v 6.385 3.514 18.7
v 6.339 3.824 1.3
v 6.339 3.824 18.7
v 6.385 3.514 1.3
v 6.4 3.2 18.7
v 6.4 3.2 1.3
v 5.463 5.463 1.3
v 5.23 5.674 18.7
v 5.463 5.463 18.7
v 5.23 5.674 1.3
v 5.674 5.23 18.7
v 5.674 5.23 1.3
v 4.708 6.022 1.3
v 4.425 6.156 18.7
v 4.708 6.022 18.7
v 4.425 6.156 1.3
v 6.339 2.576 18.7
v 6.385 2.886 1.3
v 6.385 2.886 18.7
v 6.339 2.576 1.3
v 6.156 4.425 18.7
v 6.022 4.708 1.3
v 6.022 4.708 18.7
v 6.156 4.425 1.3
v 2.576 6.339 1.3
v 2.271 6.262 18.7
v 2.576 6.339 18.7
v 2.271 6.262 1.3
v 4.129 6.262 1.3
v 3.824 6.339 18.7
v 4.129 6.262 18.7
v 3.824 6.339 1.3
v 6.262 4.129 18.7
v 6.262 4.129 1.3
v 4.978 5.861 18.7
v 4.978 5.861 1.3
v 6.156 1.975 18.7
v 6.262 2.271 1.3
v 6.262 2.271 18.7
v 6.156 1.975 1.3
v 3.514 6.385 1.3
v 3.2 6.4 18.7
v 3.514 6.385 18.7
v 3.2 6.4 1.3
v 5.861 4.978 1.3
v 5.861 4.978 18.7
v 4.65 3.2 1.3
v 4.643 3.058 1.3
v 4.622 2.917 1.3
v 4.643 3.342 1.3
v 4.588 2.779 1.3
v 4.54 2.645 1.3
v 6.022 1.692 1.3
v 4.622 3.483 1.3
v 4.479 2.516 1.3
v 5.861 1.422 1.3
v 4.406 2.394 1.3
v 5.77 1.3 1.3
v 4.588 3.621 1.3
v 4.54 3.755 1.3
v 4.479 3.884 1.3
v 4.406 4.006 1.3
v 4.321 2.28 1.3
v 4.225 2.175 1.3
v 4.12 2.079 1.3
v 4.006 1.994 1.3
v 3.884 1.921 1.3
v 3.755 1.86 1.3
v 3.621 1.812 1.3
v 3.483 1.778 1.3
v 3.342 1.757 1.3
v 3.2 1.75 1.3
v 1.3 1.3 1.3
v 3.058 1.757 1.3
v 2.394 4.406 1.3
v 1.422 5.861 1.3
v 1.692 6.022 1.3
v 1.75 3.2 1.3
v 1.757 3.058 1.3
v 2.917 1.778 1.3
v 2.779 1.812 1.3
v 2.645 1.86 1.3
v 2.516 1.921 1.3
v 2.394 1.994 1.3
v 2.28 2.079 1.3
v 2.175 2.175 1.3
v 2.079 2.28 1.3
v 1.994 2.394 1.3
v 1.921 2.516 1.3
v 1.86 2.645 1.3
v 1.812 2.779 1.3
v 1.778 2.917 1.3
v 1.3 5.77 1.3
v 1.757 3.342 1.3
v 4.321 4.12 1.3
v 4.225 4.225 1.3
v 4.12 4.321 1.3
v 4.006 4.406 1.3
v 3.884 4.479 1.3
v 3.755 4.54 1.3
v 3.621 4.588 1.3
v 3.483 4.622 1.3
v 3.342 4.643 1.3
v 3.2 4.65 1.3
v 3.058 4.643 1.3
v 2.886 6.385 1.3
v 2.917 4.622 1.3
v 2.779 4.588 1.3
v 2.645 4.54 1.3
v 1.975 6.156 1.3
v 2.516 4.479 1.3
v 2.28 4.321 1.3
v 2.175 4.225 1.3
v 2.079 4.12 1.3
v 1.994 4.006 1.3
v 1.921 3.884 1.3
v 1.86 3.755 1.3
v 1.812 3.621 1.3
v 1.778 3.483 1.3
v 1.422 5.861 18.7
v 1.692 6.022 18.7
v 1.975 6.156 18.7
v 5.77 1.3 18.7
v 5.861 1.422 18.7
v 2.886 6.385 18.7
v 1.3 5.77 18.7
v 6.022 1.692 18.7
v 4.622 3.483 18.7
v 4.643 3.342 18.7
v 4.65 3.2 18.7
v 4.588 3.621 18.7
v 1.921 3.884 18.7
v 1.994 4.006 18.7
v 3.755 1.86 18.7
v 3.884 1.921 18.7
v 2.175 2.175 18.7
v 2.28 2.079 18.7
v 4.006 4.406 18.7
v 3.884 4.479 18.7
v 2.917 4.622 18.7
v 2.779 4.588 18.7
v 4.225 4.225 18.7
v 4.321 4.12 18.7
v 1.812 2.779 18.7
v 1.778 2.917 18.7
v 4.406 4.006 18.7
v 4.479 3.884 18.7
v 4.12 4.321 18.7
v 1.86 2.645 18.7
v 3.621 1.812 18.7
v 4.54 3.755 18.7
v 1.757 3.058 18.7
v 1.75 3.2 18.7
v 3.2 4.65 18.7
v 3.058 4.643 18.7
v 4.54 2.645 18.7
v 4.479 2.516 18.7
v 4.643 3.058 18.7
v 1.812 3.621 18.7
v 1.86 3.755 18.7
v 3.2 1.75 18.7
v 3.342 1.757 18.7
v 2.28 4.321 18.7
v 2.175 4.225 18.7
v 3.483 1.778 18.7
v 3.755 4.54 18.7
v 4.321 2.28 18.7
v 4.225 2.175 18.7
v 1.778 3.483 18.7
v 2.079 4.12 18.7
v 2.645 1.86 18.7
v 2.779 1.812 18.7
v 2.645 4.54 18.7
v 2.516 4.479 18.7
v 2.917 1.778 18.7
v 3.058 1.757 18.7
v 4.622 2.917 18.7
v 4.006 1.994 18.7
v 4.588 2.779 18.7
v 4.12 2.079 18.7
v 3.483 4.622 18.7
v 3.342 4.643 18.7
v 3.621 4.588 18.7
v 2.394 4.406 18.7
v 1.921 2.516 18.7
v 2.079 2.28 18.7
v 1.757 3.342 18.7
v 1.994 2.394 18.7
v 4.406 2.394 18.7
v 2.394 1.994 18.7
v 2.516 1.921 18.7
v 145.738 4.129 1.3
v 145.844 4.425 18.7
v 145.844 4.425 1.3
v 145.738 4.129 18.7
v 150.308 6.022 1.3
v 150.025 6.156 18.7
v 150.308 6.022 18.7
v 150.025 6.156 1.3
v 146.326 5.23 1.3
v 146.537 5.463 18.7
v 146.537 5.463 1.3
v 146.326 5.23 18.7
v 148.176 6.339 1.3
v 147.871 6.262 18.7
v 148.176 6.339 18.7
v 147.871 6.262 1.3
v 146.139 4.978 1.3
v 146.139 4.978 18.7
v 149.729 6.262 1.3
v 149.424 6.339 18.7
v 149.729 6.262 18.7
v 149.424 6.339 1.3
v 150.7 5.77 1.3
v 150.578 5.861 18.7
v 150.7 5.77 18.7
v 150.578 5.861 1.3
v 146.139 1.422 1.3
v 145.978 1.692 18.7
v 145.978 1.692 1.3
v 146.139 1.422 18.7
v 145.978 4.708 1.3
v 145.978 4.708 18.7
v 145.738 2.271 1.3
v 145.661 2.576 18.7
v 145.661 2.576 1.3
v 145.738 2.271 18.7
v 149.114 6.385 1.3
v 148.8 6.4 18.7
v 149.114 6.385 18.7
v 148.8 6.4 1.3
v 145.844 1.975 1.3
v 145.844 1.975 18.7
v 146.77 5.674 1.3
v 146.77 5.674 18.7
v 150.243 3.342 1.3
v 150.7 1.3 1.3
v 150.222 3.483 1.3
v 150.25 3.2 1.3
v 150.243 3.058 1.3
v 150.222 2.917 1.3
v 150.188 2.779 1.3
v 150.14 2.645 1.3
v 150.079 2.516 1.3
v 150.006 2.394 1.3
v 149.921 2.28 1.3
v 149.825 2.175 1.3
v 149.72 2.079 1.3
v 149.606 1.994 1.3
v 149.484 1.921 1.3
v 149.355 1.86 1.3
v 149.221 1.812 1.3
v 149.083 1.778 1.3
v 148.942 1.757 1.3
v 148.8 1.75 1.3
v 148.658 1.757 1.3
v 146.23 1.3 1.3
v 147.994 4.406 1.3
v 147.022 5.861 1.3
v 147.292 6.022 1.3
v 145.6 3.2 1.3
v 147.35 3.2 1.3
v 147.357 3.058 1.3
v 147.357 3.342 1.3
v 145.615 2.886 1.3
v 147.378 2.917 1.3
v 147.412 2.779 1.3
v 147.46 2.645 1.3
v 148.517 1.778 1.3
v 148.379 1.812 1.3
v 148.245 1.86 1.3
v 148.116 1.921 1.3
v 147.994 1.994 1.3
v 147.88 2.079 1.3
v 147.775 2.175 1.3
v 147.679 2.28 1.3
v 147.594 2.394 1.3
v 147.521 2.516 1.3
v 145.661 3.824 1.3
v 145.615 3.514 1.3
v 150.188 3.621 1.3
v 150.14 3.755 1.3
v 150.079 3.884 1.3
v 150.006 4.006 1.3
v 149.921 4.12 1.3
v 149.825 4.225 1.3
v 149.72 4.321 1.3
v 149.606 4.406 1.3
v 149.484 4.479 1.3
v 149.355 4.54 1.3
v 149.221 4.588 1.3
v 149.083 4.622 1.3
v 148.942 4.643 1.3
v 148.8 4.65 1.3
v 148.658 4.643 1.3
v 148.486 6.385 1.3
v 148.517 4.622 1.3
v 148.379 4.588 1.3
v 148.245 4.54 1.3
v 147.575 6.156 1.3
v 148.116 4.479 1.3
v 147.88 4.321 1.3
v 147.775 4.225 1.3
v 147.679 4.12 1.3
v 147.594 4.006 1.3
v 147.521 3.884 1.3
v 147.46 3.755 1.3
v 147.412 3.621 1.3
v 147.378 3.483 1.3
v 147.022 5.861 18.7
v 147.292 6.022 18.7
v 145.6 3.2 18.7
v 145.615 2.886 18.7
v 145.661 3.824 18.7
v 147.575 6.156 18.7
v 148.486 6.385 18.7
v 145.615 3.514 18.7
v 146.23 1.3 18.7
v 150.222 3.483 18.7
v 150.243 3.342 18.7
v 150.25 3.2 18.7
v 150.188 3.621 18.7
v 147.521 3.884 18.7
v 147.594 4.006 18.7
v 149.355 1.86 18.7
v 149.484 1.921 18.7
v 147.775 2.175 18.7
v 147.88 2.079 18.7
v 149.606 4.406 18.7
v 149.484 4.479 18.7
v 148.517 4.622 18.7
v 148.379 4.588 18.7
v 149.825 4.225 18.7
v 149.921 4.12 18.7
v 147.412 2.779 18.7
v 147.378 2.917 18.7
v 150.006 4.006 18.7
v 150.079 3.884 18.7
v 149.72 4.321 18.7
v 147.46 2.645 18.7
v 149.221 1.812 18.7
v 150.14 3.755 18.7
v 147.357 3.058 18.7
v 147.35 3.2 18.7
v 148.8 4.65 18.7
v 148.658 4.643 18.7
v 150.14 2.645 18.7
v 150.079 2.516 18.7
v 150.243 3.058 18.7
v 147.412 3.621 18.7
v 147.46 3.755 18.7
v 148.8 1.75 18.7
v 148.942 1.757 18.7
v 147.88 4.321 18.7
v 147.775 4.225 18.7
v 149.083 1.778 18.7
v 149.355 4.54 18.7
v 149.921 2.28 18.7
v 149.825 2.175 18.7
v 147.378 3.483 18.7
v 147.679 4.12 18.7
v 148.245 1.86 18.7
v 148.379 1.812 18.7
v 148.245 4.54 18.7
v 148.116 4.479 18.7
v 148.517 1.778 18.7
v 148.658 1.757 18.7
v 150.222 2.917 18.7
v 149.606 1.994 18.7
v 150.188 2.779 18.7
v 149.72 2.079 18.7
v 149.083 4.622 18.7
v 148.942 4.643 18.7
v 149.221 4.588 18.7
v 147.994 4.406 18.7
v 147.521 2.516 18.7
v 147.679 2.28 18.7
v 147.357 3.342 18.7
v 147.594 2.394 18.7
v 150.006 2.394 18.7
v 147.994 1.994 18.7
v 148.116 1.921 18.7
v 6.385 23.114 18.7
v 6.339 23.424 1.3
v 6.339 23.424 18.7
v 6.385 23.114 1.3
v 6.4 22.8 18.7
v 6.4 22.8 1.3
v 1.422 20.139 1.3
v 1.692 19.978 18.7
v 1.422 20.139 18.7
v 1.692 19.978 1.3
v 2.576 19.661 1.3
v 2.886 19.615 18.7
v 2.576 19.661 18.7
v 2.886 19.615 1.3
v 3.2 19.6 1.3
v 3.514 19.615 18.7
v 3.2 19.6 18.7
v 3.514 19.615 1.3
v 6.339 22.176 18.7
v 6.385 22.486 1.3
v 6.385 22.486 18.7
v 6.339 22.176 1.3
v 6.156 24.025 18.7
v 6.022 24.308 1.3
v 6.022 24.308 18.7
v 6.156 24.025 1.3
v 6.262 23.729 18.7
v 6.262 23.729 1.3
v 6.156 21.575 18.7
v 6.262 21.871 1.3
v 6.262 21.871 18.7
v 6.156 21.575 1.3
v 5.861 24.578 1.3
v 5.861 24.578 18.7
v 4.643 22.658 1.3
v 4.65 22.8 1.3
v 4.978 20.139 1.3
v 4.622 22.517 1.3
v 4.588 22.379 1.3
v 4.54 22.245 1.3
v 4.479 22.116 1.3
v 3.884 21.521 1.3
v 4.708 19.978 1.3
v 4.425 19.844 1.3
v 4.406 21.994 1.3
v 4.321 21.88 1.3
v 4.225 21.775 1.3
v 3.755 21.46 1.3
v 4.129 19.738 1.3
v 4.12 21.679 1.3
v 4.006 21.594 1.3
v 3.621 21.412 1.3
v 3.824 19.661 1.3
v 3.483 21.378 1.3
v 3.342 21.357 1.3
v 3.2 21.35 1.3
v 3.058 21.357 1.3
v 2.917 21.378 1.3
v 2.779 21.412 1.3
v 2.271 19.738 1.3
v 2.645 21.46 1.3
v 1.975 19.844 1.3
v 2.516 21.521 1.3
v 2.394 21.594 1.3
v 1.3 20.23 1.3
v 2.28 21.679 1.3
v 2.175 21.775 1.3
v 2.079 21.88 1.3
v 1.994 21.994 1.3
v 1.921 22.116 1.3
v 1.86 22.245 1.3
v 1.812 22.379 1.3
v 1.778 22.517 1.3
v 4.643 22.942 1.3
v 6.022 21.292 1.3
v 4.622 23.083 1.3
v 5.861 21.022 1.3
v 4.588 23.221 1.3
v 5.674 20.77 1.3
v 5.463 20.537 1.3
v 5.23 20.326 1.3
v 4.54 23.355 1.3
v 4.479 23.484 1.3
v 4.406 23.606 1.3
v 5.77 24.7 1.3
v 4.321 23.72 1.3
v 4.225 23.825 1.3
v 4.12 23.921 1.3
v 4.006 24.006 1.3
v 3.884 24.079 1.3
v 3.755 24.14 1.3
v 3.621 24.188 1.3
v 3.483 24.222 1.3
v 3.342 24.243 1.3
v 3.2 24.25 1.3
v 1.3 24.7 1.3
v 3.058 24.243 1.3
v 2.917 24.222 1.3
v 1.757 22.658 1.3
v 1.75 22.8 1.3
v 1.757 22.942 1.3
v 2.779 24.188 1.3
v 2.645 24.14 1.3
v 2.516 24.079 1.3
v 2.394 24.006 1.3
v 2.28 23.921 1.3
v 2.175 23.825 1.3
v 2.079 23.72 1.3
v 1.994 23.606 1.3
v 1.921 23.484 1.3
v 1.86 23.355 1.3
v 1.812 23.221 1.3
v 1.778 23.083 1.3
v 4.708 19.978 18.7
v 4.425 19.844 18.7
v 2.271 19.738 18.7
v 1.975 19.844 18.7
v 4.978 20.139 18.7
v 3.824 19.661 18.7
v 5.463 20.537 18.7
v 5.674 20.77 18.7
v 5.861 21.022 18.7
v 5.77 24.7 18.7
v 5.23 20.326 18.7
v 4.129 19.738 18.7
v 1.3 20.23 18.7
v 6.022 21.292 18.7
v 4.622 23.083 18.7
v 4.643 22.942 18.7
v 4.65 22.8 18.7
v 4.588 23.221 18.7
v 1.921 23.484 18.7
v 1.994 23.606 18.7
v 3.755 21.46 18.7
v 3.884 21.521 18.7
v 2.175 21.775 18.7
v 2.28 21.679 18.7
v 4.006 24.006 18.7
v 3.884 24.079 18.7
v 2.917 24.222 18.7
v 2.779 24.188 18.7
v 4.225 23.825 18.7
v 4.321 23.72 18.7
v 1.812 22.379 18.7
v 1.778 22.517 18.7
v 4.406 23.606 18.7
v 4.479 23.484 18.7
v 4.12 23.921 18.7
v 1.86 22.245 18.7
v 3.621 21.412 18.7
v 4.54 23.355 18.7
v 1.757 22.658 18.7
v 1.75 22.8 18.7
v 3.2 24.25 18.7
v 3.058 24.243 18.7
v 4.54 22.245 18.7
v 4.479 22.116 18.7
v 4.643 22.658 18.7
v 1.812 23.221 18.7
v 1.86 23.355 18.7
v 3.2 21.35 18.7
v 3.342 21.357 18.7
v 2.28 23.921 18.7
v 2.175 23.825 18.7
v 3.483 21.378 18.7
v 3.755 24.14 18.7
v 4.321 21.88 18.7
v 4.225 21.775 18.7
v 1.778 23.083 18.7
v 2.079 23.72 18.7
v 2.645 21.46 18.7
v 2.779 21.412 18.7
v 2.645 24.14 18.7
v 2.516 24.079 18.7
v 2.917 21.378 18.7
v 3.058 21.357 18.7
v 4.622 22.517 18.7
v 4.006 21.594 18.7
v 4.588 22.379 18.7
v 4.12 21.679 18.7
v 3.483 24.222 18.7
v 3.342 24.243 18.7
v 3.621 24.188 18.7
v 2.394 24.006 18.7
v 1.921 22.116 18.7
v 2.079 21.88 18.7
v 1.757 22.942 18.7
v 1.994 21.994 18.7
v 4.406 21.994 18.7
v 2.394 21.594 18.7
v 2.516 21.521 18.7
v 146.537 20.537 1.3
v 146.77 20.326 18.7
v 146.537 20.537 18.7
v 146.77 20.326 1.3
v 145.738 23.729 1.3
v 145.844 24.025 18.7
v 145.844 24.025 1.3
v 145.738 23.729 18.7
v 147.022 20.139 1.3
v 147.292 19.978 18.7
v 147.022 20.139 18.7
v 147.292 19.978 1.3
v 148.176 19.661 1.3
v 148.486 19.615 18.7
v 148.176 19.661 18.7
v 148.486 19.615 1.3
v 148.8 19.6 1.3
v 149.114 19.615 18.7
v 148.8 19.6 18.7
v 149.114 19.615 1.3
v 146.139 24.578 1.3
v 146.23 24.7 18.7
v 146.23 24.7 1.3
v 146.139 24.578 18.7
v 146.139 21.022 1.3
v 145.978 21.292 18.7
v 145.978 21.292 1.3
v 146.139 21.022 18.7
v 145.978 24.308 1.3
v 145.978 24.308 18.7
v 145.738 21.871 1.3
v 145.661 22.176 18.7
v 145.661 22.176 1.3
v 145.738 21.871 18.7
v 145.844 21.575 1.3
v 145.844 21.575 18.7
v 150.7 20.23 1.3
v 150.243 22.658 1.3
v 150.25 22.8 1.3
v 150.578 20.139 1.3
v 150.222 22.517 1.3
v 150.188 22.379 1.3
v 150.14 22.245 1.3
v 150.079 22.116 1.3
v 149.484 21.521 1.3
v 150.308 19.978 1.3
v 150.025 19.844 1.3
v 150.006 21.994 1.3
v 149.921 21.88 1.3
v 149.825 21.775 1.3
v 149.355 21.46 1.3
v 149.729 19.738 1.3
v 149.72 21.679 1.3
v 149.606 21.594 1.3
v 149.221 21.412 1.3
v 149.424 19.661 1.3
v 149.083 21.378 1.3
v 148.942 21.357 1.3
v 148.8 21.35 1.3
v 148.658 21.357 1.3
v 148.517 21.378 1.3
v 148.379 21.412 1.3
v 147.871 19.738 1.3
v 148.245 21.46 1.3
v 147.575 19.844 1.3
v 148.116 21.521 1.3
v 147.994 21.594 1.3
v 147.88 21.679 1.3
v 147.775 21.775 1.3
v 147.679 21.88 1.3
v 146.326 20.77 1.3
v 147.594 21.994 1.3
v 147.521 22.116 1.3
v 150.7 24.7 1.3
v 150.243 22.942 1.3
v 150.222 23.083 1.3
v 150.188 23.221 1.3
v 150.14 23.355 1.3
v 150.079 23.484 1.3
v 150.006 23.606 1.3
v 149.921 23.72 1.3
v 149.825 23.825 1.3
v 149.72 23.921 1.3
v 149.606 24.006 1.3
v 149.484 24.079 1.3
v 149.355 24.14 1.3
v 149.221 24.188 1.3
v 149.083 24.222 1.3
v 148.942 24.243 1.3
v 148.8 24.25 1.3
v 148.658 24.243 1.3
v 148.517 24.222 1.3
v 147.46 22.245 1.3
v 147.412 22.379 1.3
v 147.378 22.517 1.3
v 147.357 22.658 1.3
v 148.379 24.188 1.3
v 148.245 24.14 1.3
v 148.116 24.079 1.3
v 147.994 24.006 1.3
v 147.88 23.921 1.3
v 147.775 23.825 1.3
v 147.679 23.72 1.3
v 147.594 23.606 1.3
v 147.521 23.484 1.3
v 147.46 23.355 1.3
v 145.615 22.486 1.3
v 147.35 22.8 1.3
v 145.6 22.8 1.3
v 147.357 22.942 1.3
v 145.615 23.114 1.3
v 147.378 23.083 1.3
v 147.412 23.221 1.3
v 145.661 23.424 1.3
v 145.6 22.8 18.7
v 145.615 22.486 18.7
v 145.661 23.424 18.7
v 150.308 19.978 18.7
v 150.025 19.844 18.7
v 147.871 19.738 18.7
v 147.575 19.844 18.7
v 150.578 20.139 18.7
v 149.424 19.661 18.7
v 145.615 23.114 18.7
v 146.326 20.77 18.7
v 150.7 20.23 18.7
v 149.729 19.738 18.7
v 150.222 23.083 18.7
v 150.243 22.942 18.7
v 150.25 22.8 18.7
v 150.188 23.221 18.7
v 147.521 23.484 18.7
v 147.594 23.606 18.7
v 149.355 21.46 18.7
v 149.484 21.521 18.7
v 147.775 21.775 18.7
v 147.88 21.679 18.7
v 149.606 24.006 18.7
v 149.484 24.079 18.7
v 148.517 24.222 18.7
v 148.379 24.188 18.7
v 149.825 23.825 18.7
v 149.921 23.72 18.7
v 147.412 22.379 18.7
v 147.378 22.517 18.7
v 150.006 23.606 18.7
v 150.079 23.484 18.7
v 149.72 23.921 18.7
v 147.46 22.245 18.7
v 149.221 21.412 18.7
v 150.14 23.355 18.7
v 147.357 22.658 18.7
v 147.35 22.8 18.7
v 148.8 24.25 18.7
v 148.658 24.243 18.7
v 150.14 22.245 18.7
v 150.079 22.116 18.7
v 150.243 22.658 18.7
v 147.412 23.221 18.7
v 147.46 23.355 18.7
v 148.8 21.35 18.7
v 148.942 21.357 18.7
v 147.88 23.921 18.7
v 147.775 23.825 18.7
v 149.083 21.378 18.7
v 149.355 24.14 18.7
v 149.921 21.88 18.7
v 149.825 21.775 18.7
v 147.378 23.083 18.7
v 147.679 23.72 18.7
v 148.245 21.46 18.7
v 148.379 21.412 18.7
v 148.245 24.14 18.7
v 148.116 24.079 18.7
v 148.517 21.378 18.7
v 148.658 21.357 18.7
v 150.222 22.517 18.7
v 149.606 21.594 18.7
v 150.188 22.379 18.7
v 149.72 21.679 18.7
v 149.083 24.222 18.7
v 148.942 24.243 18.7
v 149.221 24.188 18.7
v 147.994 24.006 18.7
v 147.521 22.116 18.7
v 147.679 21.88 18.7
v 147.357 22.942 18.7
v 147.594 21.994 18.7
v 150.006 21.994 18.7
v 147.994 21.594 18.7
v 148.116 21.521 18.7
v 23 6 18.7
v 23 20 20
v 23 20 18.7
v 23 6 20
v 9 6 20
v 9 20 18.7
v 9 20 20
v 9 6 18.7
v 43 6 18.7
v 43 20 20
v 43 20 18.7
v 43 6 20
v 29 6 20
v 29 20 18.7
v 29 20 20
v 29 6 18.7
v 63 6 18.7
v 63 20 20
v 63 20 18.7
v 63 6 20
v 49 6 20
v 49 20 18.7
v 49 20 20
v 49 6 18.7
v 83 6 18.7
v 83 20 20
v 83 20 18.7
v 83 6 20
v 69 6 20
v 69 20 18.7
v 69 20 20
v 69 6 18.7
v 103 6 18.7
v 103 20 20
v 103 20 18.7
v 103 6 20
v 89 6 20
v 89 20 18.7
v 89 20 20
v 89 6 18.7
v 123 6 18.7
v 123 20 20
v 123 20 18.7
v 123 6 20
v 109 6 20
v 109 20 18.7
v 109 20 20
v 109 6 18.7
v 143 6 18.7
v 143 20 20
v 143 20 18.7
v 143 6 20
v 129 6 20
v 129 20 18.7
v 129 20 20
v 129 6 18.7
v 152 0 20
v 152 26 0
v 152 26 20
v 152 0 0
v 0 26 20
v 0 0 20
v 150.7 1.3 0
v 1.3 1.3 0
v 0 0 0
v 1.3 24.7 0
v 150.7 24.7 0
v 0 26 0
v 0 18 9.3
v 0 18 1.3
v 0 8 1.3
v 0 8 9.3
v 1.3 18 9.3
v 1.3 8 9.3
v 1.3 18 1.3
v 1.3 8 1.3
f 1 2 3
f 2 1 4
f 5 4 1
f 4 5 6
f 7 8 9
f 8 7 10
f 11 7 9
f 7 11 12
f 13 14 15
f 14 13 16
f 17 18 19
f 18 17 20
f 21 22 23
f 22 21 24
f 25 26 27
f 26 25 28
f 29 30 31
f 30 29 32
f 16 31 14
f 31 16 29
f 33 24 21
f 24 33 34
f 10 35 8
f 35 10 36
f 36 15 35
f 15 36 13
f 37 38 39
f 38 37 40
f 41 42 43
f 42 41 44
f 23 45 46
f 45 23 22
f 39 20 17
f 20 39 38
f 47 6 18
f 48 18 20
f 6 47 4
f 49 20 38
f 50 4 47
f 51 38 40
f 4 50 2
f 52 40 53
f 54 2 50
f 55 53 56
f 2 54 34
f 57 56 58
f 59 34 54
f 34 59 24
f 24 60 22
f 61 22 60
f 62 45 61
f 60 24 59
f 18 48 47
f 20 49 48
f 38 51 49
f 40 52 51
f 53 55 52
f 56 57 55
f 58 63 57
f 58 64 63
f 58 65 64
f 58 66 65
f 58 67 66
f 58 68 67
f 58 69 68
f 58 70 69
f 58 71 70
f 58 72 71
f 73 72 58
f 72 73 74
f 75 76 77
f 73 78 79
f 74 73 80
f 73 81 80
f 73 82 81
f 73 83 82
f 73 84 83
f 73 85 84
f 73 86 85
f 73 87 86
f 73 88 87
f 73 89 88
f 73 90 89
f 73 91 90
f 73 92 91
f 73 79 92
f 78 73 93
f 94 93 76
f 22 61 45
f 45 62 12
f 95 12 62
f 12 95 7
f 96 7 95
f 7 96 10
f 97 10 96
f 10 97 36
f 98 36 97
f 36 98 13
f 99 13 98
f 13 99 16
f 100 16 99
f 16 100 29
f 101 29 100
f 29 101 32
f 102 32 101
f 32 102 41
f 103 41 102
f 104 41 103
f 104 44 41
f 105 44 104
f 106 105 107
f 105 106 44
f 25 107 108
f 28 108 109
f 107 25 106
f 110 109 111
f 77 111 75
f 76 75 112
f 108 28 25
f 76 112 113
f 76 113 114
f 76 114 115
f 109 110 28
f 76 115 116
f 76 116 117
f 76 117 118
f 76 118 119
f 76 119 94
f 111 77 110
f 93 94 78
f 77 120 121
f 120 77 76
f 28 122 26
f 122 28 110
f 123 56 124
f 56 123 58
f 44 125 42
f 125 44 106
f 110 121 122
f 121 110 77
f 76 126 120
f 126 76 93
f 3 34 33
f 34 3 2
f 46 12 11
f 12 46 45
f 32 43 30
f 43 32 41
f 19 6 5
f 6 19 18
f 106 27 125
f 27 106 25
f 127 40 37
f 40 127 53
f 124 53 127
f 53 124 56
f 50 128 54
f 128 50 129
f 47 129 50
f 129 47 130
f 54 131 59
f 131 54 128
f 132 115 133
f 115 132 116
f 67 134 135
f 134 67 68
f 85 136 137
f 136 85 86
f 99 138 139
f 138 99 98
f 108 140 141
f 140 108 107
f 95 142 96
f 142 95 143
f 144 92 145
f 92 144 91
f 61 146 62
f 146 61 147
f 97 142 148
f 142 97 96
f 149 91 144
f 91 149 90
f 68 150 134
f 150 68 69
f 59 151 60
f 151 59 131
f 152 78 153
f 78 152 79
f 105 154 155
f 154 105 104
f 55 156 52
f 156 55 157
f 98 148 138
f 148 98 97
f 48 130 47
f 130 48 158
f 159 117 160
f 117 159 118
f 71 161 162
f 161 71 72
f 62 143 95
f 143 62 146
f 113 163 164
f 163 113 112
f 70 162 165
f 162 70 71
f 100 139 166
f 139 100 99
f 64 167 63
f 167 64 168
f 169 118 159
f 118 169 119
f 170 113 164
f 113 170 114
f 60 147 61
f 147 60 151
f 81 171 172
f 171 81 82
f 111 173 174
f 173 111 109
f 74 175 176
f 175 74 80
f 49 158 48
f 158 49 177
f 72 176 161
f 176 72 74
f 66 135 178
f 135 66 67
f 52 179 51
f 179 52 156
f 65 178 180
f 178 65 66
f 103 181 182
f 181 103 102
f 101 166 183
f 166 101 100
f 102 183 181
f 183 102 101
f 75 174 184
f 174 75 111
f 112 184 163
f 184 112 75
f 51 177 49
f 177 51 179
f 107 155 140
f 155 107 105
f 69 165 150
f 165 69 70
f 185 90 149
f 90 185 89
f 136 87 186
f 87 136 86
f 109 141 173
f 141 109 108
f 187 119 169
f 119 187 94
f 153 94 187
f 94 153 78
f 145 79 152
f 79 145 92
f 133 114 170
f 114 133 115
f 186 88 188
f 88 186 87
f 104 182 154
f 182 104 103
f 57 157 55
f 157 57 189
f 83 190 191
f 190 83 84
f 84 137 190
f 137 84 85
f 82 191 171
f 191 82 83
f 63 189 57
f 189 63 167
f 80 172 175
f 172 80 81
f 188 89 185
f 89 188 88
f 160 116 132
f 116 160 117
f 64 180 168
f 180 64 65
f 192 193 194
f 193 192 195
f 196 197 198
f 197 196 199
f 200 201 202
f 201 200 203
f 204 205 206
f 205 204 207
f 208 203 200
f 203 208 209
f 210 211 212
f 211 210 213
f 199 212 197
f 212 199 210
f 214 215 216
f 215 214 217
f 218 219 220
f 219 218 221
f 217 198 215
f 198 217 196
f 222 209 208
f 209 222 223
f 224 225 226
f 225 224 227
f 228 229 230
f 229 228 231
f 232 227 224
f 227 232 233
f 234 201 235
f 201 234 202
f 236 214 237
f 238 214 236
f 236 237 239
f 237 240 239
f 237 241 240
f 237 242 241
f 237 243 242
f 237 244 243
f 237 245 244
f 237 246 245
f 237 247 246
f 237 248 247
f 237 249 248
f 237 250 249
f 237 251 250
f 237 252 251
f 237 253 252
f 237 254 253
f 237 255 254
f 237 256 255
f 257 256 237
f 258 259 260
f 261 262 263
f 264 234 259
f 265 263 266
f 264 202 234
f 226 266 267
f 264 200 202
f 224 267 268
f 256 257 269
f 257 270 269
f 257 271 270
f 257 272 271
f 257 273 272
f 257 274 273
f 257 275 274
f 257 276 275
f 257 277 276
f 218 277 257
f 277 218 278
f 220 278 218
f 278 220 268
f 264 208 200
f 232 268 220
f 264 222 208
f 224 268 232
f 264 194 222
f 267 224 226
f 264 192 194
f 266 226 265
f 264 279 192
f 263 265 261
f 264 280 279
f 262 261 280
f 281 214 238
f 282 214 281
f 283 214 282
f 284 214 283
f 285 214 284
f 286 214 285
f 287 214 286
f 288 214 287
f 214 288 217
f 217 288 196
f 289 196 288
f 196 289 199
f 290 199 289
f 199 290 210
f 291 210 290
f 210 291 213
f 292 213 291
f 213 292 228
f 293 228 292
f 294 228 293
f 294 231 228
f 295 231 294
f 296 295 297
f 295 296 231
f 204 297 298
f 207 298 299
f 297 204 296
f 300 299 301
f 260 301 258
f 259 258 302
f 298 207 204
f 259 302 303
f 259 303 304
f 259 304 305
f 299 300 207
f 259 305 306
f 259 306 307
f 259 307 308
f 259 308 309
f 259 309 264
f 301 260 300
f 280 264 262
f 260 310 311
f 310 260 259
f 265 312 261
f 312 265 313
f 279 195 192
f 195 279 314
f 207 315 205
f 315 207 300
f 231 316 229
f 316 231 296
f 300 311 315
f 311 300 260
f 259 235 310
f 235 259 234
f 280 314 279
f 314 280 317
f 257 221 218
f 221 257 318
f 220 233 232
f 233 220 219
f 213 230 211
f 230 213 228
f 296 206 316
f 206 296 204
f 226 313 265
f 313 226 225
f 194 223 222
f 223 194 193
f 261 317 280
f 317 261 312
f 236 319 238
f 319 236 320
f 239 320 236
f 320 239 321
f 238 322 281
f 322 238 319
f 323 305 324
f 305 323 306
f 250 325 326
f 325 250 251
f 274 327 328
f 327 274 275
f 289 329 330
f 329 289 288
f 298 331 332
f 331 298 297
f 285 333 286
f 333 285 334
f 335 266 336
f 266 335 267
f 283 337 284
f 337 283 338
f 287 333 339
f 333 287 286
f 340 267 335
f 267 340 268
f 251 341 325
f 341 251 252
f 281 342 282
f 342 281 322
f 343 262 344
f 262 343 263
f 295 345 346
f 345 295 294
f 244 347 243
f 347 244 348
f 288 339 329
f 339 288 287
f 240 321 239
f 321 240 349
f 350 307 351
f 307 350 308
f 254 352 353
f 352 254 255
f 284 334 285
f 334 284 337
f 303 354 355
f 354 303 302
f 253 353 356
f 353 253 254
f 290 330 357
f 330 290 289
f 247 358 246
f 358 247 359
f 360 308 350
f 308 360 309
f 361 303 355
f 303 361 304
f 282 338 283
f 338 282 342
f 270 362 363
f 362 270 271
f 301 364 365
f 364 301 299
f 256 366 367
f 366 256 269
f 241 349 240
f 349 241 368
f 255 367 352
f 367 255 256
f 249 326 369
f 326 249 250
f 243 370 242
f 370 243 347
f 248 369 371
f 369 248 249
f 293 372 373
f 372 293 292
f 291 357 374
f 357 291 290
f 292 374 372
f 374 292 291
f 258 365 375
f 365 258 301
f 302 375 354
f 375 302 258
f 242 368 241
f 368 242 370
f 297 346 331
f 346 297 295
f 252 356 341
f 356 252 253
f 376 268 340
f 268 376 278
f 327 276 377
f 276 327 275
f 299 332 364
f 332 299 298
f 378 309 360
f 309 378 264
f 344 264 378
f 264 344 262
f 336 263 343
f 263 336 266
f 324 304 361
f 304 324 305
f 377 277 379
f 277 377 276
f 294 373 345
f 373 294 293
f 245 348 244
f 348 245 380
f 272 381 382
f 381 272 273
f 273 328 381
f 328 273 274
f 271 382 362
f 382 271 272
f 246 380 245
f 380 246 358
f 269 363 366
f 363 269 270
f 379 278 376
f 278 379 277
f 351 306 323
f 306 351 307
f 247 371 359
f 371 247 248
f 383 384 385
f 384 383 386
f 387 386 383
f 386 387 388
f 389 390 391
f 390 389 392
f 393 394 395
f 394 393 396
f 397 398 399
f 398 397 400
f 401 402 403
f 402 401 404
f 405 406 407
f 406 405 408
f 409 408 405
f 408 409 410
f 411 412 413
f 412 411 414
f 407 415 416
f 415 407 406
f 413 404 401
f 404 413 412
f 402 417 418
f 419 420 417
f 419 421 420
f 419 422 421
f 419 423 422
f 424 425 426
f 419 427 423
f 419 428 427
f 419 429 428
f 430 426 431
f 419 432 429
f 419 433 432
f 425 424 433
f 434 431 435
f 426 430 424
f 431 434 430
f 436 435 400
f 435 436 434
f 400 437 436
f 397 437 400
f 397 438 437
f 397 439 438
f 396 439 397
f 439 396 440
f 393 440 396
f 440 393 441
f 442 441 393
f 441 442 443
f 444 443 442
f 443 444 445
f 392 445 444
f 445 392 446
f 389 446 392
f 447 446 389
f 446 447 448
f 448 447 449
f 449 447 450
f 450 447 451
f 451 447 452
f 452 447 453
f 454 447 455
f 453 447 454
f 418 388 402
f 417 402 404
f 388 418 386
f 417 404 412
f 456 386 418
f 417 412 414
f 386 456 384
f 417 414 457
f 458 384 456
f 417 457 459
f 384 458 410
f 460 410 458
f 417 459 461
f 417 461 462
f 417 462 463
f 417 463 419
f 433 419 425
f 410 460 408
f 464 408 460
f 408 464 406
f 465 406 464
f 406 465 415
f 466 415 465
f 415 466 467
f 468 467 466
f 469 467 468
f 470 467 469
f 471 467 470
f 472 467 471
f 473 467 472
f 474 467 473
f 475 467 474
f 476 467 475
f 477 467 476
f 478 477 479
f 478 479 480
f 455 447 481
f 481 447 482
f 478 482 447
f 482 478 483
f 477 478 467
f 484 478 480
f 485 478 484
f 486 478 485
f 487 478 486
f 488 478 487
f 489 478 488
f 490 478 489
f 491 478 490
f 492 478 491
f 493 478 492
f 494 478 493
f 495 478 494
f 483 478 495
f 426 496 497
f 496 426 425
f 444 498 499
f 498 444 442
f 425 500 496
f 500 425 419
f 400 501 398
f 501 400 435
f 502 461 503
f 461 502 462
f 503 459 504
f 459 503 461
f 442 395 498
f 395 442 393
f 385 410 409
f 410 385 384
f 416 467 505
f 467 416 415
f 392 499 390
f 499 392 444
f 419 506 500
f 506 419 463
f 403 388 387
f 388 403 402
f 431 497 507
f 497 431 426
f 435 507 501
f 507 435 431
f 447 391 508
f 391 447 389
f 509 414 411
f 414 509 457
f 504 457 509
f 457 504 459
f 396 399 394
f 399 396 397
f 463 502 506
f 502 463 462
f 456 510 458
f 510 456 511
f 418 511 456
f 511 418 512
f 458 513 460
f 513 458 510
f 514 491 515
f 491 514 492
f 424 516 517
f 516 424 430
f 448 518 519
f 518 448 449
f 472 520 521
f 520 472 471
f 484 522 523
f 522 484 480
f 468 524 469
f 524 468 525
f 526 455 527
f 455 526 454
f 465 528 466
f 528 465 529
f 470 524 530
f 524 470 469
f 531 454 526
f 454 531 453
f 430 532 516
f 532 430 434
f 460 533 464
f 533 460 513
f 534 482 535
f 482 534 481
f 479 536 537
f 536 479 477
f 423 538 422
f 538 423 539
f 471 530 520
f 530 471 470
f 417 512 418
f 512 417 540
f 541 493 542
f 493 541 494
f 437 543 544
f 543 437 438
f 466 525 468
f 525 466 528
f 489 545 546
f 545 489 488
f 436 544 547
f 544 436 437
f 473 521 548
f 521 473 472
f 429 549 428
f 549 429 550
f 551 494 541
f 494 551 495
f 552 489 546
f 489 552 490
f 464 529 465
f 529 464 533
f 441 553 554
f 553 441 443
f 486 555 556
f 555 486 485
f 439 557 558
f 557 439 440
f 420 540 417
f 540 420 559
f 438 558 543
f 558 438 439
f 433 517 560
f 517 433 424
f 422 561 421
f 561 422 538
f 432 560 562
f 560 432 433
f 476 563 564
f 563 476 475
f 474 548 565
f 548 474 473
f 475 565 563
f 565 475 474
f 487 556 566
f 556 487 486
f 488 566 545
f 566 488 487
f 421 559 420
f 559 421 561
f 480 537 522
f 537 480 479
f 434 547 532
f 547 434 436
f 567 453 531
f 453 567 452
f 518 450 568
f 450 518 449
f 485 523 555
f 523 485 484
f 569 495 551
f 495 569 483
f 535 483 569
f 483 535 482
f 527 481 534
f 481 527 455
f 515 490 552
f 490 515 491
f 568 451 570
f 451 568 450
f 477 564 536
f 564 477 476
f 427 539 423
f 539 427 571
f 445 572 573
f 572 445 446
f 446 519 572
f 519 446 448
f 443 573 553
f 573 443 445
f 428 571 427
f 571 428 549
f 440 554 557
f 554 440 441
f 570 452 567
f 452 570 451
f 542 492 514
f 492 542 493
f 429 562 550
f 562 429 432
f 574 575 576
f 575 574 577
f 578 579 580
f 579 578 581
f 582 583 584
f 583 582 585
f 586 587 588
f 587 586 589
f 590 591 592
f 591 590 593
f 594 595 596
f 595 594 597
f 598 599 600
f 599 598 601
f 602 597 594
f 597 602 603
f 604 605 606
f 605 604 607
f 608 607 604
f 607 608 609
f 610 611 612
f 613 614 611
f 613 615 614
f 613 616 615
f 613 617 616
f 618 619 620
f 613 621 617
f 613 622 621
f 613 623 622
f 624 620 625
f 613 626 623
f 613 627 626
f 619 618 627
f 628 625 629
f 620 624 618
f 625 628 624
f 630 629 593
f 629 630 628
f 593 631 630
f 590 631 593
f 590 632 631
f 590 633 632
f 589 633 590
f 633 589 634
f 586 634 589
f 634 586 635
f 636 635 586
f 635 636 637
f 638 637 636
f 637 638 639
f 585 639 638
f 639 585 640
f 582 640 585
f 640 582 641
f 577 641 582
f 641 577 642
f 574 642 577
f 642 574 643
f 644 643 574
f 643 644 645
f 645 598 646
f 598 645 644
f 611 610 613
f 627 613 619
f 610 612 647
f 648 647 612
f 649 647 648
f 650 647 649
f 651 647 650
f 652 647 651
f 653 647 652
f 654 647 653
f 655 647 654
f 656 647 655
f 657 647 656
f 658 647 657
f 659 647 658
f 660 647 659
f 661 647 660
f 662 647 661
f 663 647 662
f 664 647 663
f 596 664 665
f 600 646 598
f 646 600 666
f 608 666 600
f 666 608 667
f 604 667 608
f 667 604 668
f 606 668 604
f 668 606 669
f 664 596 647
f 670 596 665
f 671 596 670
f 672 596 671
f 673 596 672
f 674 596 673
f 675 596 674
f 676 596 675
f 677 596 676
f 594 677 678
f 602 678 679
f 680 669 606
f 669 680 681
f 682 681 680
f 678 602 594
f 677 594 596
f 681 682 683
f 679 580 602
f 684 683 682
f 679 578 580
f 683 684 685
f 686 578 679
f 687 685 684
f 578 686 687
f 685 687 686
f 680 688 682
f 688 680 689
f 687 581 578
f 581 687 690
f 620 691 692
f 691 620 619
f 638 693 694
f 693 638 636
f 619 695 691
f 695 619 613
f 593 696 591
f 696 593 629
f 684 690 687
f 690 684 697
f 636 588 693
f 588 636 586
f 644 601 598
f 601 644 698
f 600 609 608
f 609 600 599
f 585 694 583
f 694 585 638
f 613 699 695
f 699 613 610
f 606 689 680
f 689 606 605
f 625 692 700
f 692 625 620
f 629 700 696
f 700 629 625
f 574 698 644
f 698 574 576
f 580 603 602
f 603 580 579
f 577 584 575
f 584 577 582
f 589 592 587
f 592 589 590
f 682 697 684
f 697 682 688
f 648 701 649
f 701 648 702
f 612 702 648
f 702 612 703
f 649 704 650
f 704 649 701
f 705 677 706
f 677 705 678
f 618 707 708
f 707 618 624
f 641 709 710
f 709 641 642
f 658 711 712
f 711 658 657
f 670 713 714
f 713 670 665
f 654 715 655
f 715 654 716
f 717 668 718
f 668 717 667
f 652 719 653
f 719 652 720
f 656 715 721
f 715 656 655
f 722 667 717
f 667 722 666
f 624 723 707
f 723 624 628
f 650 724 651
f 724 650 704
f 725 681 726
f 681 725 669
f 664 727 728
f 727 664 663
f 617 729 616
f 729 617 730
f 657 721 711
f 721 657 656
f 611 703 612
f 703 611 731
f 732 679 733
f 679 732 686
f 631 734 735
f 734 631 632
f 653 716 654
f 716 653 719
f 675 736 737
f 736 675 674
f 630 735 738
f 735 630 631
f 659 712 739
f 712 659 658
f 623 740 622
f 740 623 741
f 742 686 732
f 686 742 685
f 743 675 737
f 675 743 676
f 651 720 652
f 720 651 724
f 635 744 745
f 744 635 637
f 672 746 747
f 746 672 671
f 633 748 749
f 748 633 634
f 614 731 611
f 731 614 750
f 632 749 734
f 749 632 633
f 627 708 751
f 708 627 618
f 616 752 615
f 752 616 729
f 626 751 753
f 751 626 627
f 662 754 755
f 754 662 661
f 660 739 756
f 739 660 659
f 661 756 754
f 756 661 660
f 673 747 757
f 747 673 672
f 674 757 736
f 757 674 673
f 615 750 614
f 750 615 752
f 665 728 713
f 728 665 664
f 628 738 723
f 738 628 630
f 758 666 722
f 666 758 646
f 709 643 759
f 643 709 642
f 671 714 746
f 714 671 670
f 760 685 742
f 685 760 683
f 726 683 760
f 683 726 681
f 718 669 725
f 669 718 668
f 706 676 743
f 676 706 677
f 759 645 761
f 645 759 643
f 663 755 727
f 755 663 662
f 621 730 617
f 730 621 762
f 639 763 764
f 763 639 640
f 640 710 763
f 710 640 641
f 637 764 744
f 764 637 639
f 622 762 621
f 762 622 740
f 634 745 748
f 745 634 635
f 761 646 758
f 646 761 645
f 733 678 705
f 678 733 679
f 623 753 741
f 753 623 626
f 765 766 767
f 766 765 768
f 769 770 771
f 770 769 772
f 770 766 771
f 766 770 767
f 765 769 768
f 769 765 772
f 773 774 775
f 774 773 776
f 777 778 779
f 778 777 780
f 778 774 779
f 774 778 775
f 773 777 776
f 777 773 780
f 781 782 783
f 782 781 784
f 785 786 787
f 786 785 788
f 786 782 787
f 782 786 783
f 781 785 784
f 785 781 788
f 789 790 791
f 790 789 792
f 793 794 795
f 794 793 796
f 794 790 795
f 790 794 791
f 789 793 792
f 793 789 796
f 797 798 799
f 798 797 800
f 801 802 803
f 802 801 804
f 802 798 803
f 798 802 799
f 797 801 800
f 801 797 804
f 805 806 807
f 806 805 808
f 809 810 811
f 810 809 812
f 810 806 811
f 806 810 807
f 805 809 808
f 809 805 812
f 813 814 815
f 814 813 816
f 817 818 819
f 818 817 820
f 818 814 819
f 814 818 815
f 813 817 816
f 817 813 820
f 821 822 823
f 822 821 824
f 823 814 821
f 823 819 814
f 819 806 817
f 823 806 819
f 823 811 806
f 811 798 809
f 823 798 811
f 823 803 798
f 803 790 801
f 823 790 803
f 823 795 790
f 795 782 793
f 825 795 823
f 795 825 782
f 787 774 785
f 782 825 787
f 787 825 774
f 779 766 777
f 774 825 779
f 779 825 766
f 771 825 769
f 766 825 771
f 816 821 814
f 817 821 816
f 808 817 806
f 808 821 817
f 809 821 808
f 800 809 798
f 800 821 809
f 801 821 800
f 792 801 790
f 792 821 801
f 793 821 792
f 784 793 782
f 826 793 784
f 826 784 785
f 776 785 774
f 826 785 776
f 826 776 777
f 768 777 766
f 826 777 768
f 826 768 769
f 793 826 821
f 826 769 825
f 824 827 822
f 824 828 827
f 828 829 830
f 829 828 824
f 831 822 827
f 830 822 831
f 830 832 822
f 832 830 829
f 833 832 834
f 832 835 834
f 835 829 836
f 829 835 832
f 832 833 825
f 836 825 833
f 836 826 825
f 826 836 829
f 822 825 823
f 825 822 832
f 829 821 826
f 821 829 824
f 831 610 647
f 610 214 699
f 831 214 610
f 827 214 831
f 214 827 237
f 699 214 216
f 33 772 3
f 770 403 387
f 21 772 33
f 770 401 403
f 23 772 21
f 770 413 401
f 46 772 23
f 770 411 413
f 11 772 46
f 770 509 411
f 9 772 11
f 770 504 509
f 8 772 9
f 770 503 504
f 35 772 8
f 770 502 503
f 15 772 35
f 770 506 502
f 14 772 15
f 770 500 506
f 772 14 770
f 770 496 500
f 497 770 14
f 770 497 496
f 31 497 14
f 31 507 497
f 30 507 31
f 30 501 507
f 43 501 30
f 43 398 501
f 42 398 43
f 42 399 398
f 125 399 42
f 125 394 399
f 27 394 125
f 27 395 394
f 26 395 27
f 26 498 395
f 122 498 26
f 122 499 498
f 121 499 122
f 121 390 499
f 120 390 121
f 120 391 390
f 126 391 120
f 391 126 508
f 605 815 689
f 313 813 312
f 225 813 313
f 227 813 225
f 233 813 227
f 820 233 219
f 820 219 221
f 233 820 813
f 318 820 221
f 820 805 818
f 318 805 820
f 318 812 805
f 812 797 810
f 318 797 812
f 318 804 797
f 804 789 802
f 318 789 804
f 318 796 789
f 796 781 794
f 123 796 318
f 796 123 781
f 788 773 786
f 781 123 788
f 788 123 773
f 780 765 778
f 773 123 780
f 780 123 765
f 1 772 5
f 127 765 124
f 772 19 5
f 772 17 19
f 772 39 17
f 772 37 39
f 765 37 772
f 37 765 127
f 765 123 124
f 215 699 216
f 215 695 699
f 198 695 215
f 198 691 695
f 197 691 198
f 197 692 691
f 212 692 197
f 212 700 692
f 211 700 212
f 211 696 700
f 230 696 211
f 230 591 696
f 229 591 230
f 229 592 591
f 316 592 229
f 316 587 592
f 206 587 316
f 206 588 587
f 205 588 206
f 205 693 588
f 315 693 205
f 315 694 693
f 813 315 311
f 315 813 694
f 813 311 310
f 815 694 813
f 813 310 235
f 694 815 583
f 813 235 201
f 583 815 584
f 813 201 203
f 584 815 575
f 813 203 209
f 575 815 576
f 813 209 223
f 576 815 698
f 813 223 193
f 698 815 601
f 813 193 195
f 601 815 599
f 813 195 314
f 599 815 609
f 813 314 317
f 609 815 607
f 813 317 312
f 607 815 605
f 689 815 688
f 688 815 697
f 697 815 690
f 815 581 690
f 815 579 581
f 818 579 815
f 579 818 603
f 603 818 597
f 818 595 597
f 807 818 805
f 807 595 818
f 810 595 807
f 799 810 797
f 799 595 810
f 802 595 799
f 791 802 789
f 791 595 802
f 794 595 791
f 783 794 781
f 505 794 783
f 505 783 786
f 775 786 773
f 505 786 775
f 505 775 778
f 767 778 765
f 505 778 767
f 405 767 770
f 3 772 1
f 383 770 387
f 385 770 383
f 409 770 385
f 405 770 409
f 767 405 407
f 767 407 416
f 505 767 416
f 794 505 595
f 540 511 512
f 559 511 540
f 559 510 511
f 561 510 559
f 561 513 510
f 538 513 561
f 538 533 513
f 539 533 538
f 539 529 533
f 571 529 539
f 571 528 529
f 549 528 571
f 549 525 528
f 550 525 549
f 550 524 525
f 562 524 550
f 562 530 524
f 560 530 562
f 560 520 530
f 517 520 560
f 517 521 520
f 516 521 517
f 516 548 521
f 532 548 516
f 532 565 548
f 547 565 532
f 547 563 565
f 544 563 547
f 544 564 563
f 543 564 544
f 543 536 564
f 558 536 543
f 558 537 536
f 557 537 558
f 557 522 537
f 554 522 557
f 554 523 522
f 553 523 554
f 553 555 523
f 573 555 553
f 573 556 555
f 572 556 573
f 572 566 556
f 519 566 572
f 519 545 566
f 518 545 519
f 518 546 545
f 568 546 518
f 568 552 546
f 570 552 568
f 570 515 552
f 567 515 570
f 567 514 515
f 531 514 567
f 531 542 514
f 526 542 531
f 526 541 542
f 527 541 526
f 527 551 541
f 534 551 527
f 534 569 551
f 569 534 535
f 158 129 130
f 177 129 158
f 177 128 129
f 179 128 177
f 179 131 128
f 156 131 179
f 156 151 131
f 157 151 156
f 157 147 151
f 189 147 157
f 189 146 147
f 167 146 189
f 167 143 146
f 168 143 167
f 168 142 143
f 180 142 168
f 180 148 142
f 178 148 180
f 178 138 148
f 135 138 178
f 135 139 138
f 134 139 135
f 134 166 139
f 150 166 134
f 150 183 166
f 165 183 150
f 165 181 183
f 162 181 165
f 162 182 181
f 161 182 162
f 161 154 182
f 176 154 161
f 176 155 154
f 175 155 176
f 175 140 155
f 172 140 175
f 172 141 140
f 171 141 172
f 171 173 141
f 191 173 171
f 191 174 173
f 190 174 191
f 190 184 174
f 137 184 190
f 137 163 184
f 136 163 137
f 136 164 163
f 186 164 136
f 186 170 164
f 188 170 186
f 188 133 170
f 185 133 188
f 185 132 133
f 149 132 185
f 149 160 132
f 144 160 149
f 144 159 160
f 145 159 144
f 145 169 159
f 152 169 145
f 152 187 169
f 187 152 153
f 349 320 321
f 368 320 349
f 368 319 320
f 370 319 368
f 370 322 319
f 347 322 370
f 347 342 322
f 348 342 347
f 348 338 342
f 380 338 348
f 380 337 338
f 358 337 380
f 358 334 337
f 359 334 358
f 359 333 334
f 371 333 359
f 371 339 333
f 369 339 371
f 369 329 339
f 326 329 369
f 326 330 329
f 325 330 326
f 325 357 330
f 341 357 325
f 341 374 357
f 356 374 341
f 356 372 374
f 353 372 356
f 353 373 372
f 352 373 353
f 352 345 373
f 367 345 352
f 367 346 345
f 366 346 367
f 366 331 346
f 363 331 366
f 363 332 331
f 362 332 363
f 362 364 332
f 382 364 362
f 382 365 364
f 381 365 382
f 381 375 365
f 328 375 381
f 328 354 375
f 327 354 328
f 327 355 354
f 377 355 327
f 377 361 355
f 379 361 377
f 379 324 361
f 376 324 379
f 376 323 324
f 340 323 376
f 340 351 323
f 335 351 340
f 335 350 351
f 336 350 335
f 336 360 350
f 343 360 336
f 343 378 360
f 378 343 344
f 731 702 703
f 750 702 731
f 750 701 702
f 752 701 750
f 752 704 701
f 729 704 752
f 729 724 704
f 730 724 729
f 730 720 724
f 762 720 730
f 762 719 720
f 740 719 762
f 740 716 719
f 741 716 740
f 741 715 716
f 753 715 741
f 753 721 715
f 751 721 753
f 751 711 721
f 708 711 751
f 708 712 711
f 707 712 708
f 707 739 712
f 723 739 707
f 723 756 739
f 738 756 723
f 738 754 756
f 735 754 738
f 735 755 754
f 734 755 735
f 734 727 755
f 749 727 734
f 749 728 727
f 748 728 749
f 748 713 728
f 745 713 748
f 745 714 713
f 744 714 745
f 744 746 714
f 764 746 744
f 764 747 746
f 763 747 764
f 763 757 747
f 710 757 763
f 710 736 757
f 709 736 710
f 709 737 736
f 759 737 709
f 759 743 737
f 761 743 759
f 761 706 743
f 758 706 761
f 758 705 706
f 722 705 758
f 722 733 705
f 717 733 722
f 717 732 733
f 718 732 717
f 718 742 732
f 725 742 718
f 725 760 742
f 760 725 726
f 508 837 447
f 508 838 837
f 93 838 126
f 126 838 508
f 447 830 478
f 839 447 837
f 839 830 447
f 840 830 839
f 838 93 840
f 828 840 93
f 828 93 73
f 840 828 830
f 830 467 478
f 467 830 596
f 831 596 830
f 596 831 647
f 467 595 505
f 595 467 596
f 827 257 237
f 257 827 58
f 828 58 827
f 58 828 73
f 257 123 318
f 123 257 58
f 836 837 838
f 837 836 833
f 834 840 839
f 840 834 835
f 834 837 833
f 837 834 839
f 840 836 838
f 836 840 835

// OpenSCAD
// Copyright (C) Peter Ivanov <ivanovp@gmail.com>, 2023
// License: Attribution-NonCommercial-ShareAlike (CC BY-NC-SA)

/* 1: Render top of case */
enable_top = 1;
/* 1: Render bottom of case */
enable_bottom = 0;

case_height = 20;
keybody_width = 14;
keybody_length = 14;
keybody_height = 8;
thickness = 1.3;
/* Number of keys */
key_num = 7;
key_space_x = 6;
key_space_x_left = 3;
key_space_x_right = 3;
key_space_y = 6;
cylinder_outer_diameter = 6.4;
cylinder_inner_diameter = 2.9;
/* 4 drill's diameter to fasten bottom part to the top */
drill_diameter = 3.4;
/* Cutout for USB cable */
cutout_width = 10;
cutout_height = 8;

/* Internal variables */
delta = 0.1;
w = keybody_width + key_space_x;
fw = w * key_num + key_space_x + key_space_x_left + key_space_x_right;
epsilon = 0.1;
$fn = 64;
echo("Internal width: ", keybody_length + key_space_y * 2 - thickness * 2);

module cyl()
{
    color("lightblue") difference()
    {
        cylinder(h=case_height - thickness, d=cylinder_outer_diameter);
        translate([0, 0, -epsilon]) cylinder(h=case_height - thickness + epsilon * 2, d=cylinder_inner_diameter);
    }
}

module cyl2()
{
    translate([0, 0, -epsilon]) cylinder(h=case_height - thickness + epsilon * 2, d=drill_diameter);
}

if (enable_top)
{
    translate([cylinder_outer_diameter / 2, cylinder_outer_diameter / 2, thickness]) cyl();
    translate([fw - cylinder_outer_diameter / 2, cylinder_outer_diameter / 2, thickness]) cyl();
    translate([cylinder_outer_diameter / 2, keybody_length + key_space_y * 2 - cylinder_outer_diameter / 2, thickness]) cyl();
    translate([fw - cylinder_outer_diameter / 2, keybody_length + key_space_y * 2 - cylinder_outer_diameter / 2, thickness]) cyl();

    color("lightblue") difference()
    {
        cube([fw, keybody_length + key_space_y * 2, case_height]);
        translate([thickness, thickness, -epsilon]) cube([fw - thickness * 2, keybody_length + key_space_y * 2 - thickness * 2, case_height - thickness + epsilon]);
        for (i = [0 : key_num - 1])
        {
            translate([key_space_x_left + i * w + key_space_x, key_space_y, case_height - keybody_height / 2]) cube([keybody_width, keybody_length, keybody_height]);
        }
        translate([-epsilon, keybody_length / 2 + key_space_y - cutout_width / 2, thickness]) cube([thickness + epsilon * 2, cutout_width, cutout_height]);
    }
}

if (enable_bottom)
{
    translate([0, 0, -thickness]) difference()
    {
        union()
        {
            cube([fw, keybody_length + key_space_y * 2, thickness]);
            translate([thickness + delta, thickness + delta, thickness]) cube([fw - thickness * 2 - delta * 2, keybody_length + key_space_y * 2 - thickness * 2 - delta * 2, thickness - delta * 2]);    
        }
        translate([cylinder_outer_diameter / 2, cylinder_outer_diameter / 2, 0]) cyl2();
        translate([fw - cylinder_outer_diameter / 2, cylinder_outer_diameter / 2, 0]) cyl2();
        translate([cylinder_outer_diameter / 2, keybody_length + key_space_y * 2 - cylinder_outer_diameter / 2, 0]) cyl2();
        translate([fw - cylinder_outer_diameter / 2, keybody_length + key_space_y * 2 - cylinder_outer_diameter / 2, 0]) cyl2();       
    }
}
